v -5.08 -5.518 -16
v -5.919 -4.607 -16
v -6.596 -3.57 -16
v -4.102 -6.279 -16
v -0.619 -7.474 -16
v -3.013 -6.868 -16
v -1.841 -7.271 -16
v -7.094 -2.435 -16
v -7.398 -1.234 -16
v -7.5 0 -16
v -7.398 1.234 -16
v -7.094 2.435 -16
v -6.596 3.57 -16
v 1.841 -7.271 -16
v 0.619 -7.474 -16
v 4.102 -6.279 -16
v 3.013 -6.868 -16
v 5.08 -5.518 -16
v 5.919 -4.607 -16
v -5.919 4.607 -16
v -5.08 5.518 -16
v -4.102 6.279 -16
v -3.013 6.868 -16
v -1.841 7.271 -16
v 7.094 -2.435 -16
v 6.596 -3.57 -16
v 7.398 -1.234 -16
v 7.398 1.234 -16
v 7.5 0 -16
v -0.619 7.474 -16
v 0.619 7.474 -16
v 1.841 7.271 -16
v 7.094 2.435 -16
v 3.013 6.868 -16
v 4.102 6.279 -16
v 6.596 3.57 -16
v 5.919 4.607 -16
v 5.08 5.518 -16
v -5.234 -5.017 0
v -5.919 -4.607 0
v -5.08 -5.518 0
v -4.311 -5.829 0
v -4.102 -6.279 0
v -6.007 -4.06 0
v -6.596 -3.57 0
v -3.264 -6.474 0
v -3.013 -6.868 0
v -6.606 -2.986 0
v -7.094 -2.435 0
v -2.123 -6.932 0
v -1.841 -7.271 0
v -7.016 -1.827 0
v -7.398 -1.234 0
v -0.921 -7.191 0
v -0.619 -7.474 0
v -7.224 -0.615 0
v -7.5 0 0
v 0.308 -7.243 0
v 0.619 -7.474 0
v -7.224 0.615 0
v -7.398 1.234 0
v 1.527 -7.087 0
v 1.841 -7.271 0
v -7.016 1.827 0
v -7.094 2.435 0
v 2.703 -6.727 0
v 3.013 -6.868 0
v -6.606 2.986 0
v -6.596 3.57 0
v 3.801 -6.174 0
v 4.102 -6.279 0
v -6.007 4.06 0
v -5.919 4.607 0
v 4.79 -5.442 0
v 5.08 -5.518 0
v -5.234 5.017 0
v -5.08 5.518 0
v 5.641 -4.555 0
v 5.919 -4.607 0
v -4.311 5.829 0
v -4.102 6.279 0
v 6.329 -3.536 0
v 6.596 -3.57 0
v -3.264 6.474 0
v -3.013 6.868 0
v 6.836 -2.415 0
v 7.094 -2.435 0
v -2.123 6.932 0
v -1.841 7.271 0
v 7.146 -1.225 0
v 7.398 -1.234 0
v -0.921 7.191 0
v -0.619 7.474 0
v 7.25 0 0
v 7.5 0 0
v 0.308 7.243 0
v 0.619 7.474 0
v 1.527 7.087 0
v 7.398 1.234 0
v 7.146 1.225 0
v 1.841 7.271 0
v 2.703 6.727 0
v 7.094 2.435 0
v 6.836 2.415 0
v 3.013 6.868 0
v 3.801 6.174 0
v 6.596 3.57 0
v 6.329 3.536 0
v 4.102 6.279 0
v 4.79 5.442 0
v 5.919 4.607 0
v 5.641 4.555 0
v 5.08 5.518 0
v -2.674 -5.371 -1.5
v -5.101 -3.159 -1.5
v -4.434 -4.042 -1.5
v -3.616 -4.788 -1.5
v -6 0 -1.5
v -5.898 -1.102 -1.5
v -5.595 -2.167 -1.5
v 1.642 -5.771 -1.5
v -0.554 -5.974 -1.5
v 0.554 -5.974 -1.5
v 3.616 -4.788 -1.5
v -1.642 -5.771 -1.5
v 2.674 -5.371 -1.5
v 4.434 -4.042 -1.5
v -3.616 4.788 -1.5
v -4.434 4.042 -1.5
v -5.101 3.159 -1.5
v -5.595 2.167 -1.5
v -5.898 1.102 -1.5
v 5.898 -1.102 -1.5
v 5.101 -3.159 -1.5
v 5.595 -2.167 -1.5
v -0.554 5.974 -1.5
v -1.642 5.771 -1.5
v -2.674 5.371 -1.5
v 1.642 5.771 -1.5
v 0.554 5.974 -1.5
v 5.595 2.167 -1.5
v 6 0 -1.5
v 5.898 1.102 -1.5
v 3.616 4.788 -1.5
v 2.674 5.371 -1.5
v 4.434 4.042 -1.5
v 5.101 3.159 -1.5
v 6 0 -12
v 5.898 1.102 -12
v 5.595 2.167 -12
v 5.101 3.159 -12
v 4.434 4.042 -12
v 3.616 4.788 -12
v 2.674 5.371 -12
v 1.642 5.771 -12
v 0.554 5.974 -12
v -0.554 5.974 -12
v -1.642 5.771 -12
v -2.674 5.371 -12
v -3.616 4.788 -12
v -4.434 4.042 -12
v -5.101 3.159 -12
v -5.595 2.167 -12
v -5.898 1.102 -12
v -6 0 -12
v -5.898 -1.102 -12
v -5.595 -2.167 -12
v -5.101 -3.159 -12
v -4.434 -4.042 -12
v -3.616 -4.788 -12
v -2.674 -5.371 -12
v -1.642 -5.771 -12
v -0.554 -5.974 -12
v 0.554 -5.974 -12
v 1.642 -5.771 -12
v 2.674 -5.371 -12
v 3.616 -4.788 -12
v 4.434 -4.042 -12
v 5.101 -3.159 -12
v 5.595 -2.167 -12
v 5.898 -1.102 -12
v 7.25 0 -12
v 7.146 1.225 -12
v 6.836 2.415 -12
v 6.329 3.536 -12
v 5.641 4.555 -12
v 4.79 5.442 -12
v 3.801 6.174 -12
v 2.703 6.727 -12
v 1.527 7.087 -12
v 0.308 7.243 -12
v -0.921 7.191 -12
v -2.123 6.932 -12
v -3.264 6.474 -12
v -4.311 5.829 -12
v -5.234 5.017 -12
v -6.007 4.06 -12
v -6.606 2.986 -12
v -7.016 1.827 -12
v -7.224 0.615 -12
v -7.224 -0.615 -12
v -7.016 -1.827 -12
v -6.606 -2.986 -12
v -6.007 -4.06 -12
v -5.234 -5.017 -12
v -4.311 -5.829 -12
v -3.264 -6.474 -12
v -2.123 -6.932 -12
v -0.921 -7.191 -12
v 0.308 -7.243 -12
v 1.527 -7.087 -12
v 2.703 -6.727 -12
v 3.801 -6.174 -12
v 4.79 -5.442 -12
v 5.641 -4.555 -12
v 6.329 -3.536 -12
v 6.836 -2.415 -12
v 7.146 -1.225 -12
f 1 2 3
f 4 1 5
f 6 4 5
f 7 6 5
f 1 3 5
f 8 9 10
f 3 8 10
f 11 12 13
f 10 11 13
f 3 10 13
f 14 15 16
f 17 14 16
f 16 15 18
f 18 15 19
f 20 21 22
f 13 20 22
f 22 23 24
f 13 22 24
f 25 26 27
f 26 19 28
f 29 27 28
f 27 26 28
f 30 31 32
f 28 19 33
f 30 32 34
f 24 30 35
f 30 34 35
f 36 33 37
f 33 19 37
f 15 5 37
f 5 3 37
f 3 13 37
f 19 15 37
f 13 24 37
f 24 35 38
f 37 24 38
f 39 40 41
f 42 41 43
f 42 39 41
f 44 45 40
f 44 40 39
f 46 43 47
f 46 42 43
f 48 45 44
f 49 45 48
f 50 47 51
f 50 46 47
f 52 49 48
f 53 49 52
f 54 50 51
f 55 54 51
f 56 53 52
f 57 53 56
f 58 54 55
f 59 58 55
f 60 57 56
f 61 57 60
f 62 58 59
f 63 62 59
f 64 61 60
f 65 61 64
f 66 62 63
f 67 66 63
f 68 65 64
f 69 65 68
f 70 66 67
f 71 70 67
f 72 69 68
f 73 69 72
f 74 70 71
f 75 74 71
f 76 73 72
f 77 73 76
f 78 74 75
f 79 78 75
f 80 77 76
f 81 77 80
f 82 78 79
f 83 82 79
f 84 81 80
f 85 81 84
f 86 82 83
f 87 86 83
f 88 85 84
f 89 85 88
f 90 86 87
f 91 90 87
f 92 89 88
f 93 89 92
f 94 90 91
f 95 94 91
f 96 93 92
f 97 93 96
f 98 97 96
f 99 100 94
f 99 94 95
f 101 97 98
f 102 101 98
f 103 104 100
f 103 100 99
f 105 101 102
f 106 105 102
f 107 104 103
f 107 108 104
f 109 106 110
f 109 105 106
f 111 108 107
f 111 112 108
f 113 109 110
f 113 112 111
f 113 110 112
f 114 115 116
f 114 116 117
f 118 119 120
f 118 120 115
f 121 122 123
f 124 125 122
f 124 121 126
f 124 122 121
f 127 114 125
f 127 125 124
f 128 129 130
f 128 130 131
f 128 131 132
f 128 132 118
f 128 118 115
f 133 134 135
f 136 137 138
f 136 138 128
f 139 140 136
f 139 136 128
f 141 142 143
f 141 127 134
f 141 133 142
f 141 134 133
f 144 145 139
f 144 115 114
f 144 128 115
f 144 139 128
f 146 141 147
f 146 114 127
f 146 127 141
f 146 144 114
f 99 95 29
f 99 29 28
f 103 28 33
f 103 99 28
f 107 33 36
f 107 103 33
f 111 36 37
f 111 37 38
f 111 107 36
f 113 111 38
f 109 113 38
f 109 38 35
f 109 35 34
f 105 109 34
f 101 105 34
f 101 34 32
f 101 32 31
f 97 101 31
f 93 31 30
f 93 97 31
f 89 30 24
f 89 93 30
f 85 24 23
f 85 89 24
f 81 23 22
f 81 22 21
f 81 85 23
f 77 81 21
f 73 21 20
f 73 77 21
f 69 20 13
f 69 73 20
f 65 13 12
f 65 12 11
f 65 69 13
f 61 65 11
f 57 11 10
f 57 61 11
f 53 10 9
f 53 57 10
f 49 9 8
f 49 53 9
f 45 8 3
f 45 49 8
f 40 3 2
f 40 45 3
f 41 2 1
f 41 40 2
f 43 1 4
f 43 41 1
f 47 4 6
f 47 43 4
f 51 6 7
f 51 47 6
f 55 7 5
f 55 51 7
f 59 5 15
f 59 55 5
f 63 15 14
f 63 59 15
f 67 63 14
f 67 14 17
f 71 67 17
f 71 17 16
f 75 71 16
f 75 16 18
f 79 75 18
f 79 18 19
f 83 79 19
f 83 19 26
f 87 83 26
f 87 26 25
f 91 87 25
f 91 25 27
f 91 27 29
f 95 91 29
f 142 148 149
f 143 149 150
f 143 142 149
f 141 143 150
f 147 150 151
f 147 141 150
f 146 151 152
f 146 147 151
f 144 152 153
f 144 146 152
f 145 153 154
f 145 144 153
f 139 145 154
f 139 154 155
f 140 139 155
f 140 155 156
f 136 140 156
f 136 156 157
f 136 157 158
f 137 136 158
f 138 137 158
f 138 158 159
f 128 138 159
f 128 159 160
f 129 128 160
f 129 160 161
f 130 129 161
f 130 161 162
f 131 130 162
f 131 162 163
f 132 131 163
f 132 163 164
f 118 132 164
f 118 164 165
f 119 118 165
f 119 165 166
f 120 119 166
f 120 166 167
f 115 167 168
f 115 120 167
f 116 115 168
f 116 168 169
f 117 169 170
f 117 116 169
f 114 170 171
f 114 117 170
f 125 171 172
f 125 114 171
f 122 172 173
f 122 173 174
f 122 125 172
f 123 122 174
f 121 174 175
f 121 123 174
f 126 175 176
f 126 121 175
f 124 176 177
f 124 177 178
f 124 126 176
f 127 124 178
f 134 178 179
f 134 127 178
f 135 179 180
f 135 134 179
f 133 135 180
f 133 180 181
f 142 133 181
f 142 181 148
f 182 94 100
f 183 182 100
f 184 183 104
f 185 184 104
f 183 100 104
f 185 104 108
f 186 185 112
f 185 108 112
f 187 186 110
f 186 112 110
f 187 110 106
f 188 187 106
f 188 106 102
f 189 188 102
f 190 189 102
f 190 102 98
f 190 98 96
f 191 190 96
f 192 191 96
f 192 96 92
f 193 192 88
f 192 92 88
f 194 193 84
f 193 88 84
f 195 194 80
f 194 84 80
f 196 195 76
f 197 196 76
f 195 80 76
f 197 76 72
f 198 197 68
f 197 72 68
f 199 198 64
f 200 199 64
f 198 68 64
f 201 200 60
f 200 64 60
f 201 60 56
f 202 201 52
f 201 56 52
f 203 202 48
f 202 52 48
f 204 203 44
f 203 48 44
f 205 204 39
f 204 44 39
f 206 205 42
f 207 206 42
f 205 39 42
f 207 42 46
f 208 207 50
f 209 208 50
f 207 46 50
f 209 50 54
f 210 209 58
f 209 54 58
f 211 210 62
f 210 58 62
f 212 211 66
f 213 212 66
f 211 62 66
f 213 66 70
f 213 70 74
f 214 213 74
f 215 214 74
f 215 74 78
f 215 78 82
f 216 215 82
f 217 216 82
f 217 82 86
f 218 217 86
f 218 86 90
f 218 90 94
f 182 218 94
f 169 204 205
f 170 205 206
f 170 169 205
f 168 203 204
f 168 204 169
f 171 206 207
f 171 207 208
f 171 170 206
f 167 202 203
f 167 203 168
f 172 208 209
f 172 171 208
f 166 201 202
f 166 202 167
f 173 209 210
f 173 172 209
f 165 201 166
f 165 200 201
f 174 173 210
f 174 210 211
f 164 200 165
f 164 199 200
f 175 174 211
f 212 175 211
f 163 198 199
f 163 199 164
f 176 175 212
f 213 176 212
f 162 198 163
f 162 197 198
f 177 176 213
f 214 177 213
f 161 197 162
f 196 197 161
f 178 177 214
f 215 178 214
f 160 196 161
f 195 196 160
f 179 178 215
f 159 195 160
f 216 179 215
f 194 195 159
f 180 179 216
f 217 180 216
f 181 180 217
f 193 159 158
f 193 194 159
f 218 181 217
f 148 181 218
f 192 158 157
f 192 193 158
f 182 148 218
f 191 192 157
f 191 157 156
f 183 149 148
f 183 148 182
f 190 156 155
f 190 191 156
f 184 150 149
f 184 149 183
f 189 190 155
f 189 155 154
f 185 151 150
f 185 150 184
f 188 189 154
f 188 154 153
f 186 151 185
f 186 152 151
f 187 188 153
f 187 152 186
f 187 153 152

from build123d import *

# Parameters (mm, degrees)
F0_R     = 7.5
F0_R_2   = 7.25
F0_R_3   = 6
F1_DEPTH = 16
F2_DEPTH = 12
F3_DEPTH = 1.5


with BuildPart() as f1:
    # F0 (on Top) → F1 (new body)
    with BuildSketch(Plane.XY):
        Circle(F0_R)
        Circle(F0_R_2, mode=Mode.SUBTRACT)
        Circle(F0_R_2)
        Circle(F0_R_3, mode=Mode.SUBTRACT)
        Circle(F0_R_3)
    extrude(amount=-F1_DEPTH)

    # F0 (on Top) → F2 (cut)
    with BuildSketch(Plane.XY):
        Circle(F0_R_2)
        Circle(F0_R_3, mode=Mode.SUBTRACT)
    extrude(amount=-F2_DEPTH, mode=Mode.SUBTRACT)

    # F0 (on Top) → F3 (cut)
    with BuildSketch(Plane.XY):
        Circle(F0_R_3)
    extrude(amount=-F3_DEPTH, mode=Mode.SUBTRACT)


solid = f1.part
